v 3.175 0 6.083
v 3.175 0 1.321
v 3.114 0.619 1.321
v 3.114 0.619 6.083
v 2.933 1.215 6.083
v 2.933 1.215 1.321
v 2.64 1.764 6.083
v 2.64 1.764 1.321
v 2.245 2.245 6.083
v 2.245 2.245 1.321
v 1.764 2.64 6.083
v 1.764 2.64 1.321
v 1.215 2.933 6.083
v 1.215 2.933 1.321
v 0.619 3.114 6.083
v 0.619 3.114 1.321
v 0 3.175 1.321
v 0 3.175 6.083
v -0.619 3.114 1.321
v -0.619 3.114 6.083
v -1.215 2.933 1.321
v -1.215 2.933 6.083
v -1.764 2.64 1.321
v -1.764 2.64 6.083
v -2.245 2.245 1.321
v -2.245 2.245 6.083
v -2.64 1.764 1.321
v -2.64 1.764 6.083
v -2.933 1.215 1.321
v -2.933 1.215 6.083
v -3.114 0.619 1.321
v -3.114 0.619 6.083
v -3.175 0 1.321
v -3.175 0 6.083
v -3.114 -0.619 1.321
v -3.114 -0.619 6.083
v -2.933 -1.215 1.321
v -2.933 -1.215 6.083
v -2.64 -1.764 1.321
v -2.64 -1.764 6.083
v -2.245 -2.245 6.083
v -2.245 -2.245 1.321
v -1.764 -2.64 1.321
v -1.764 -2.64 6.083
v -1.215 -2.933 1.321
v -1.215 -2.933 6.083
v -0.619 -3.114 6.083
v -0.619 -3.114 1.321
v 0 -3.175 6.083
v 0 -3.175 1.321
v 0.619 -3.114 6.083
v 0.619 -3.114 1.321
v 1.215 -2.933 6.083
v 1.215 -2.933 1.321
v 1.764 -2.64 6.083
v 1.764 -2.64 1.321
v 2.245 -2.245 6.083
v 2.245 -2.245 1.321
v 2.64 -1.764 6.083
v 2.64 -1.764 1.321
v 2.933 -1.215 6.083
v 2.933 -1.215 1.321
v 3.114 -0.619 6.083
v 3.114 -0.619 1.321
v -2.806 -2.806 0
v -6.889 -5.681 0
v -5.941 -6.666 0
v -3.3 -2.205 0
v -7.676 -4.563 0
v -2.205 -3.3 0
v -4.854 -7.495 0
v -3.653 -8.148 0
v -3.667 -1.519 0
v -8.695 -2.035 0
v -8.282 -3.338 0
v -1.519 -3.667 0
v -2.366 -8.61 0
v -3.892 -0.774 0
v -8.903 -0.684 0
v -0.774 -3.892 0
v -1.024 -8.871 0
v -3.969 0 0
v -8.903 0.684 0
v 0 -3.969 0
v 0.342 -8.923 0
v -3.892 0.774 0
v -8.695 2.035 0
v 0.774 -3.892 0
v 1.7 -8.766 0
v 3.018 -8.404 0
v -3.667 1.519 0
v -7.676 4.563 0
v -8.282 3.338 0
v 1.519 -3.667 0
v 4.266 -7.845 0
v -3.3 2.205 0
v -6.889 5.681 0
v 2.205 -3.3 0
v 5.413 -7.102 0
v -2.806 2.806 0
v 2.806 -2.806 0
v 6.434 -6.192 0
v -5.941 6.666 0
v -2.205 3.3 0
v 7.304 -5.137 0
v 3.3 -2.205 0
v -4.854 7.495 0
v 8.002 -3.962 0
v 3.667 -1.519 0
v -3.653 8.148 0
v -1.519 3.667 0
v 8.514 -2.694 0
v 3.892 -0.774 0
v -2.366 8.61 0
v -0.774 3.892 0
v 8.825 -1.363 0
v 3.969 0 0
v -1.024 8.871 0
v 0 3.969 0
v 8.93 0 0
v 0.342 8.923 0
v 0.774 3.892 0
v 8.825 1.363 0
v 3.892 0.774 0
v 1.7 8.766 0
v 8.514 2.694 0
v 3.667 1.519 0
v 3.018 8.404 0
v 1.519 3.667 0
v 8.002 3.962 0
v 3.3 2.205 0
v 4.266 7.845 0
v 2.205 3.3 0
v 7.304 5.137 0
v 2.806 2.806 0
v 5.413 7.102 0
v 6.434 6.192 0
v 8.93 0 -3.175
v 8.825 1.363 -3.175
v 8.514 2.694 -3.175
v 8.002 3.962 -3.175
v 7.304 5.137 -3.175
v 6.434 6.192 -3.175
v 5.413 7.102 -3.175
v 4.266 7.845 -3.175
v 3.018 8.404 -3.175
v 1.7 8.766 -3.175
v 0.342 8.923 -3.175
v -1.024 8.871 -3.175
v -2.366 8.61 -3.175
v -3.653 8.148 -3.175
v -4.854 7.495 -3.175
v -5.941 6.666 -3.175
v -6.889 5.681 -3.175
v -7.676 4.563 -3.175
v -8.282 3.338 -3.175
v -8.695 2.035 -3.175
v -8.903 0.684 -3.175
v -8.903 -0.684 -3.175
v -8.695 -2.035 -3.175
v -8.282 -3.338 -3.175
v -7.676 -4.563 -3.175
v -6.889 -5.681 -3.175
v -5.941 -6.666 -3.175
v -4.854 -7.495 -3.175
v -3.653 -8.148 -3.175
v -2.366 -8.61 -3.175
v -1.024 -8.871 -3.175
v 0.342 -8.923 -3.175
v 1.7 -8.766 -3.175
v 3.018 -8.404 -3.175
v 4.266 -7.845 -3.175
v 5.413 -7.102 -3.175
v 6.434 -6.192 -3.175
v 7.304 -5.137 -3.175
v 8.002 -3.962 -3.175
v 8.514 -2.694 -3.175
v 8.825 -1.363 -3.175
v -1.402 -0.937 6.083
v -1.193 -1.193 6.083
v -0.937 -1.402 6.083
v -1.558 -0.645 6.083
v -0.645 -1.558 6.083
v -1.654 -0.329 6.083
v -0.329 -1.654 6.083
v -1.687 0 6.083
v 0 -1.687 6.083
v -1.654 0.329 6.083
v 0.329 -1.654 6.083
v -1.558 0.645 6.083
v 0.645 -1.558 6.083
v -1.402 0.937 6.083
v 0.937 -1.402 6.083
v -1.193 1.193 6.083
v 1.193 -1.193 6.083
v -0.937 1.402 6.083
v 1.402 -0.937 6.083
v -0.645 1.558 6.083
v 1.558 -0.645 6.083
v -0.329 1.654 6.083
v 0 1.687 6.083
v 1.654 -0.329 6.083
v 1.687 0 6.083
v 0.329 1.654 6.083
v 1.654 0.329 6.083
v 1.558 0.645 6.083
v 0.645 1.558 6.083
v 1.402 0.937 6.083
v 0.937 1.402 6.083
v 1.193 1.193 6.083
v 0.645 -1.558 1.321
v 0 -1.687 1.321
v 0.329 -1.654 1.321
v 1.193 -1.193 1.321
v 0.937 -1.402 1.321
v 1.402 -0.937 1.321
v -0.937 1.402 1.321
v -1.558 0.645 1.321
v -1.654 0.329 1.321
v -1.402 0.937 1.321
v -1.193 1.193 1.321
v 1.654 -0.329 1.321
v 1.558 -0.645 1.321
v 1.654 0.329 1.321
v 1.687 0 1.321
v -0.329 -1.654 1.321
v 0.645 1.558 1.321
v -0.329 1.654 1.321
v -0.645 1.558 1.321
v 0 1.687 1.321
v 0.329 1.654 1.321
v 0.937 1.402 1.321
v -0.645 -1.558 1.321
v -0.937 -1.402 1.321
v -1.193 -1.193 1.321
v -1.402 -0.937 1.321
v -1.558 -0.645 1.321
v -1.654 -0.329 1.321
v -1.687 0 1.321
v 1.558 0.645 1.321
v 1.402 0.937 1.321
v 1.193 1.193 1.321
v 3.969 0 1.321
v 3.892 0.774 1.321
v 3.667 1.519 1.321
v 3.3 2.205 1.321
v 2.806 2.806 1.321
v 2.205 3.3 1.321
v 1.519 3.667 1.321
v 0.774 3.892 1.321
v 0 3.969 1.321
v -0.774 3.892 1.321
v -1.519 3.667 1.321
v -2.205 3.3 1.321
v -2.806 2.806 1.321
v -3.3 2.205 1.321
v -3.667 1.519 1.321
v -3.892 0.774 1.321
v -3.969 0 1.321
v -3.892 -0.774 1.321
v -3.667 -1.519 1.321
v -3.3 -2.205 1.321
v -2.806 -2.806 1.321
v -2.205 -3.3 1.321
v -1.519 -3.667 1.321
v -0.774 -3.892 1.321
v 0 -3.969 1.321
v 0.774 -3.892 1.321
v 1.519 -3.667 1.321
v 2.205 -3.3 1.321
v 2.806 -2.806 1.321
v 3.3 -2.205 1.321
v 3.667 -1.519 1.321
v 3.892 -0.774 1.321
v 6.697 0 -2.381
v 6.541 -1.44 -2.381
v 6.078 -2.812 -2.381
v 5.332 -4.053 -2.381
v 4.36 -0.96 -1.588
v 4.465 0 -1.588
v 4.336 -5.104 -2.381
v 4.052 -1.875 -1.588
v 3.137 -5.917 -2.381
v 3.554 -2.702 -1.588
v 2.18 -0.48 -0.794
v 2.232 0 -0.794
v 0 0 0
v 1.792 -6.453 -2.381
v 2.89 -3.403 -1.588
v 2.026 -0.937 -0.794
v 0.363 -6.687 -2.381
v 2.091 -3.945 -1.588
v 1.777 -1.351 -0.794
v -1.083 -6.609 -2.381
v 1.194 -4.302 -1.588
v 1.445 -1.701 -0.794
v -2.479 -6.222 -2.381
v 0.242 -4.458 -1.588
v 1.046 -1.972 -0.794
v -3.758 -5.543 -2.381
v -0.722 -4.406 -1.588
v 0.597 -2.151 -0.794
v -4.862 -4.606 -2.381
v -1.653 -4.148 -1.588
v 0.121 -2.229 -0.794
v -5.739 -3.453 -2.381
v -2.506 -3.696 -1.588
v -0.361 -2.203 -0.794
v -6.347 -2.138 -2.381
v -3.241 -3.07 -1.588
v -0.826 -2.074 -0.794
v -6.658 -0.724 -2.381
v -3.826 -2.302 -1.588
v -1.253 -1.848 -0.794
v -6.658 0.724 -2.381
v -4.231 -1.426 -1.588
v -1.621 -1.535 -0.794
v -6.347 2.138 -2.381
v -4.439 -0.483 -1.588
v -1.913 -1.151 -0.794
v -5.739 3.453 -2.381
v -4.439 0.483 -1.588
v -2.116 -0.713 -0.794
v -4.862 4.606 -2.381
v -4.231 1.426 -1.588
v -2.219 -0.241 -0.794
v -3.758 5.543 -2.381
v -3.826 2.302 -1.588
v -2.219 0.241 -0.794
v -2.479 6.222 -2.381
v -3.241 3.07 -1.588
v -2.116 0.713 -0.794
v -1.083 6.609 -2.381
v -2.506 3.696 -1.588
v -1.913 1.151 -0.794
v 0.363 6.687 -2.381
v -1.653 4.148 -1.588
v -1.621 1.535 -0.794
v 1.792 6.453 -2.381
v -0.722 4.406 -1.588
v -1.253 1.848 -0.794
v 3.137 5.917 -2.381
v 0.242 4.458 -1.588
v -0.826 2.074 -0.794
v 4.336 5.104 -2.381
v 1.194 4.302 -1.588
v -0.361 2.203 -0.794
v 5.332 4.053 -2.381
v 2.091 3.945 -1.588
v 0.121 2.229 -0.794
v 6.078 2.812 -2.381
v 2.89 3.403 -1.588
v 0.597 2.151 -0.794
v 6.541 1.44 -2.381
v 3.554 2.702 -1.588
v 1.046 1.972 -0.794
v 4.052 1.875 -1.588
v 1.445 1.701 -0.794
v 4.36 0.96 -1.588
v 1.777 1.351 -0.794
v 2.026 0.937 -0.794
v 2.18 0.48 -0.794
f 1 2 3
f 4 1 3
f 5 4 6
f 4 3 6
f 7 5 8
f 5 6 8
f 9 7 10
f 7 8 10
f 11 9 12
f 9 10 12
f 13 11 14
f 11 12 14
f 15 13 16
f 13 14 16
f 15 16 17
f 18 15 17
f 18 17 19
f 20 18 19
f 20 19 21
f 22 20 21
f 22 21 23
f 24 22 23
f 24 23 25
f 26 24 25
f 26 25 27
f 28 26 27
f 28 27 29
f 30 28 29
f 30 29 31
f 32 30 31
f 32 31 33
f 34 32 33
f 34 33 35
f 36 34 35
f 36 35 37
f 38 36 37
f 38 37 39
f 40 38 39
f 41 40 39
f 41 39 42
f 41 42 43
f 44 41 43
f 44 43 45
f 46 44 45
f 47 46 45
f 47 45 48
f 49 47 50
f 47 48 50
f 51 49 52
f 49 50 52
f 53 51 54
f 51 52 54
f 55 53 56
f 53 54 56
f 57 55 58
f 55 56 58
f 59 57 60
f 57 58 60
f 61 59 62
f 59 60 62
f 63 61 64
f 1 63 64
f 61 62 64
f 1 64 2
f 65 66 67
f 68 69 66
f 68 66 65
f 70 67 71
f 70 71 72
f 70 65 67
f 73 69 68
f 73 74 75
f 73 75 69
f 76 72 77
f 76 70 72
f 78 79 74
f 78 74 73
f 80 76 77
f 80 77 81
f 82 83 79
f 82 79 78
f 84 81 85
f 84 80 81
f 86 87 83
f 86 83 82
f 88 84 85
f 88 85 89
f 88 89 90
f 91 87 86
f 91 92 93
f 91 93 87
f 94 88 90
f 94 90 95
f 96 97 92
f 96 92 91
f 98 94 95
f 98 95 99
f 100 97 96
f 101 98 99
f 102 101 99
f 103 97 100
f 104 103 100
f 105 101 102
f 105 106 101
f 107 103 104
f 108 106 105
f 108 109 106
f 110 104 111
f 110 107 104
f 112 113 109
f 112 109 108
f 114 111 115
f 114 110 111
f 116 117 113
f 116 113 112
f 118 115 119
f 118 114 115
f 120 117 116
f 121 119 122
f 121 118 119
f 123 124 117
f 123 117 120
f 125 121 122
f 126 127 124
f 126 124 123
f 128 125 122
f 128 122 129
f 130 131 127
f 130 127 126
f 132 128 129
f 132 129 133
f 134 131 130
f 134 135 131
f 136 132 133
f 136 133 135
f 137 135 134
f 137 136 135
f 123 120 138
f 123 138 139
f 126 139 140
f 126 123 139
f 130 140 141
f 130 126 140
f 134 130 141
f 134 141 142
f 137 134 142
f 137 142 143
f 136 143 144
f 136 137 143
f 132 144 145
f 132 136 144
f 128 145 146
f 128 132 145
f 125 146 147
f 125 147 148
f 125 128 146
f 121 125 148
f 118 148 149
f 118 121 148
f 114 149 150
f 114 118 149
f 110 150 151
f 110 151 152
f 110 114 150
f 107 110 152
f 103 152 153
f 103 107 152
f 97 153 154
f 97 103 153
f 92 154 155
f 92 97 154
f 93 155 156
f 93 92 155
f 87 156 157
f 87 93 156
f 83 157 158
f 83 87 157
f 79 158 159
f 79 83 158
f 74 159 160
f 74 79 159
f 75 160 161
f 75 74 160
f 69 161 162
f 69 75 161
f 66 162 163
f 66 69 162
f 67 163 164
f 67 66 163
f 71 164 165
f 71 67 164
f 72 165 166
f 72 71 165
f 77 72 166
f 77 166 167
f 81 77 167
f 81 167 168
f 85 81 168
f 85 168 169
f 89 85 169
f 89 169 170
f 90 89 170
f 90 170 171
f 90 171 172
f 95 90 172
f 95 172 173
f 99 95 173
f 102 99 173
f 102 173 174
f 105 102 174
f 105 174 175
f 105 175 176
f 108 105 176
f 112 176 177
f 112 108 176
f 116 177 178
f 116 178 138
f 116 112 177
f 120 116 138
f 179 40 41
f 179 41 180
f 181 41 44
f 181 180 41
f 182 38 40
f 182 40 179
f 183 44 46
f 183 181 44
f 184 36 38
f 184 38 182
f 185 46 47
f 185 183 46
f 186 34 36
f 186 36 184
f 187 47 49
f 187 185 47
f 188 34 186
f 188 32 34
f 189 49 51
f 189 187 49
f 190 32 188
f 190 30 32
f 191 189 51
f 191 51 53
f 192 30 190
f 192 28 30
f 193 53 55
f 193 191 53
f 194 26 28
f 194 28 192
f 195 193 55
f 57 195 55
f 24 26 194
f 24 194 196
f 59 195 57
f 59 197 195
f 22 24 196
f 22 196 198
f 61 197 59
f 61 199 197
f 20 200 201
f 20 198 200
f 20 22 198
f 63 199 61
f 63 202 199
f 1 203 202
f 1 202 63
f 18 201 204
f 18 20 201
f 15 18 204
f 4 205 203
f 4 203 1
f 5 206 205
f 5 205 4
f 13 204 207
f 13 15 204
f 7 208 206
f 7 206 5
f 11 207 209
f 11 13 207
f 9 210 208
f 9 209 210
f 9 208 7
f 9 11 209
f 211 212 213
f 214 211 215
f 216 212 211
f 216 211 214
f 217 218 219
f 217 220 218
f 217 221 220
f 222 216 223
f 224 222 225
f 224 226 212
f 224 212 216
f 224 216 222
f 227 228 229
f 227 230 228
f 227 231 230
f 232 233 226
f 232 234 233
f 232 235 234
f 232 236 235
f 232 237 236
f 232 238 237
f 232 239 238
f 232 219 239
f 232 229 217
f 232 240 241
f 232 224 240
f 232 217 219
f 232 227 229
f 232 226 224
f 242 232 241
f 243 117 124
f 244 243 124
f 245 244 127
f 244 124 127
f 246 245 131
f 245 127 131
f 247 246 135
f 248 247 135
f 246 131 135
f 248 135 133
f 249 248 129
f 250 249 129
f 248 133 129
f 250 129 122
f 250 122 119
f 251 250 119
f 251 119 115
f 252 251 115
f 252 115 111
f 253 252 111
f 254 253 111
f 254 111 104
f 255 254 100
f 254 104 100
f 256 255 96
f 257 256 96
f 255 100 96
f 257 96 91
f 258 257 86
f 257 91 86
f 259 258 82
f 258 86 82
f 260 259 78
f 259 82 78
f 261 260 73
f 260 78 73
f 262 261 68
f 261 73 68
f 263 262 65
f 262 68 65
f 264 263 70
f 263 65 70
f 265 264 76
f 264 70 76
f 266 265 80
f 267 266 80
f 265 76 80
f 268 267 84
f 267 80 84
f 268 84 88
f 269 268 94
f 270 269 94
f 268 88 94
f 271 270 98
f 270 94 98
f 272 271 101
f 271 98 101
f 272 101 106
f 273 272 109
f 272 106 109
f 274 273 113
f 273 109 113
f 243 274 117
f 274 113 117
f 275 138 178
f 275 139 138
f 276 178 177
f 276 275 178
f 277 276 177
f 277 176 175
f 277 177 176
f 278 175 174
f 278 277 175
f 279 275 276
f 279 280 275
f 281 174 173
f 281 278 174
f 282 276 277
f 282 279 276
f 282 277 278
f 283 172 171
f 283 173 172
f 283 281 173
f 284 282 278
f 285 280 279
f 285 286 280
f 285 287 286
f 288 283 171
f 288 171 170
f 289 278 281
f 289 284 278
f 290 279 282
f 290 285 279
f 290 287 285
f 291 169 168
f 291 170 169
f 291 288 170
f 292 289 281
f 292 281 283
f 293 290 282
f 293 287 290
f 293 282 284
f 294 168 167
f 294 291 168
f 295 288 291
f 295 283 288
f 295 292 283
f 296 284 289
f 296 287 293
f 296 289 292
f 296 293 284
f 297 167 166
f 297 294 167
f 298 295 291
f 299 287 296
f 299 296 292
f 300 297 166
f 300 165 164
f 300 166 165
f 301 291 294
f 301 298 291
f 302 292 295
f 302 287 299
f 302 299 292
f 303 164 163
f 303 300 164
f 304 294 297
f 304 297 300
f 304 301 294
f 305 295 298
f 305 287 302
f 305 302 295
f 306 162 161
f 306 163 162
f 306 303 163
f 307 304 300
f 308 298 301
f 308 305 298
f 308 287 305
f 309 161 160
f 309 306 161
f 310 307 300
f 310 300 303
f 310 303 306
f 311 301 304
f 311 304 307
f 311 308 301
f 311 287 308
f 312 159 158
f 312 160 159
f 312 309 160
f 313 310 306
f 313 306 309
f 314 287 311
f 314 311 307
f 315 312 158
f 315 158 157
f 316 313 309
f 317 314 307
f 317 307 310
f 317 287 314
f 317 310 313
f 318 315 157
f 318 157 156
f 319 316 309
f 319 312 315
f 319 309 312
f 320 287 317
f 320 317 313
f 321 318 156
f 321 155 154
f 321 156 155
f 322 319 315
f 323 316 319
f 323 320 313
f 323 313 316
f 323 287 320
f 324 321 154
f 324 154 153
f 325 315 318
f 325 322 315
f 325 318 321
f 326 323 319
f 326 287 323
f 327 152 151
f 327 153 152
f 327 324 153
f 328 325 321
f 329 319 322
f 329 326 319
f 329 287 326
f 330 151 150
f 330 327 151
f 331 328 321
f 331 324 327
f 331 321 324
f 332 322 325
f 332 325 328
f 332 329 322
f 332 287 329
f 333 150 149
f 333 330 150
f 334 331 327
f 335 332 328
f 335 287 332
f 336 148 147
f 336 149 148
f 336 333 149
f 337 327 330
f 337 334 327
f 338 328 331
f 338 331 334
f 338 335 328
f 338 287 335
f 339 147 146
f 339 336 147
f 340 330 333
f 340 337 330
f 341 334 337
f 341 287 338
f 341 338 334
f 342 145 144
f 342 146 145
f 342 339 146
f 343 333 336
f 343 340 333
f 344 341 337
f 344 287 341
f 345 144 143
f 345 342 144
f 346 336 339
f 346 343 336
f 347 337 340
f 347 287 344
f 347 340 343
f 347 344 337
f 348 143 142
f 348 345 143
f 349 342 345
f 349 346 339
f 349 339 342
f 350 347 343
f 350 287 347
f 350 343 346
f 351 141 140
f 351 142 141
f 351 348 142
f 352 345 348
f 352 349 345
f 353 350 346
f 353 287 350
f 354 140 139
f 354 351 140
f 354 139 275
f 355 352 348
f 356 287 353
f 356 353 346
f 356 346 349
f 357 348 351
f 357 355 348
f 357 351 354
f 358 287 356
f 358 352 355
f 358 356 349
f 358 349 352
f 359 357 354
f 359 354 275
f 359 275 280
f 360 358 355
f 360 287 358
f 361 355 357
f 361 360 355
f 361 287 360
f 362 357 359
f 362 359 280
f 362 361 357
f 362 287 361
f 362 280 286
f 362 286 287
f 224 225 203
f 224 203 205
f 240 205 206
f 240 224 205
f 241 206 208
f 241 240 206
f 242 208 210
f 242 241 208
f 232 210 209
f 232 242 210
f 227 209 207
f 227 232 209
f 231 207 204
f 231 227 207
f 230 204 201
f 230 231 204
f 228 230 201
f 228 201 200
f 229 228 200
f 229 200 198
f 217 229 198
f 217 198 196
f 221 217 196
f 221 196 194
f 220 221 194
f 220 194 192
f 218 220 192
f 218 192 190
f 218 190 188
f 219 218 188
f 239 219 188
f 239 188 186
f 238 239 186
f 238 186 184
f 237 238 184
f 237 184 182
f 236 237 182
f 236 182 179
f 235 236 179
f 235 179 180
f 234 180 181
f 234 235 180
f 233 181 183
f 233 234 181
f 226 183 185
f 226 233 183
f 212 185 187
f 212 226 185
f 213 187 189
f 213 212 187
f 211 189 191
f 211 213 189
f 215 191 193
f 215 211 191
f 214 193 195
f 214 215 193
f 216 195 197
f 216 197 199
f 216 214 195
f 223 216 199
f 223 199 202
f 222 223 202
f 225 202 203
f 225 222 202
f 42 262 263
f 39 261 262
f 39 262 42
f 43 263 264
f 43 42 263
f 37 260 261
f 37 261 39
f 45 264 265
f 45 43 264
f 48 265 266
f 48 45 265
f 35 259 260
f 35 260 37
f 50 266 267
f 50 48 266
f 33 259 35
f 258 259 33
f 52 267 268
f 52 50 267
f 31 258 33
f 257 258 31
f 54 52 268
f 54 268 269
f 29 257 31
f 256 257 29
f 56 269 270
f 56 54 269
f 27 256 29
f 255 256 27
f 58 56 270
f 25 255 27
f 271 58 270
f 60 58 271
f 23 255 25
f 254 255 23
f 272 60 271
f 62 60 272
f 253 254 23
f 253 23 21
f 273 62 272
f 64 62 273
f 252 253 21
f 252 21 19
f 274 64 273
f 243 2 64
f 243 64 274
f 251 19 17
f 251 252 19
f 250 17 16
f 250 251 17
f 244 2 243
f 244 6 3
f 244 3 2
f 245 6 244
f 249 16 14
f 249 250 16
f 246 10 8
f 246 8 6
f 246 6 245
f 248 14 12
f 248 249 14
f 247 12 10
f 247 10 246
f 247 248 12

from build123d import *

# Parameters (mm, degrees)
F0_R      = 8.9296875
F0_R_2    = 3.96875
F0_R_3    = 3.175
F0_R_4    = 1.68671875
F1_DEPTH  = 3.175
F2_DEPTH  = 1.3208
F3_DEPTH  = 6.0833
F1_FACE_R = 8.9296875


# Not quite as in the source:
# - a length typed as a fraction of an inch, garbled in the dataset ("3 / 203.2 mm" for 3/8 in), is restored


with BuildPart() as f1:
    # F0 (on Top) → F1 (new body)
    with BuildSketch(Plane.XY):
        Circle(F0_R)
        Circle(F0_R_2, mode=Mode.SUBTRACT)
        Circle(F0_R_2)
        Circle(F0_R_3, mode=Mode.SUBTRACT)
        Circle(F0_R_3)
        Circle(F0_R_4, mode=Mode.SUBTRACT)
        Circle(F0_R_4)
    extrude(amount=-F1_DEPTH)

    # F0 (on Top) → F2 (join)
    with BuildSketch(Plane.XY):
        Circle(F0_R_2)
        Circle(F0_R_3, mode=Mode.SUBTRACT)
        Circle(F0_R_3)
        Circle(F0_R_4, mode=Mode.SUBTRACT)
        Circle(F0_R_4)
    extrude(amount=F2_DEPTH)

    # F0 (on Top) → F3 (join)
    with BuildSketch(Plane.XY):
        Circle(F0_R_3)
        Circle(F0_R_4, mode=Mode.SUBTRACT)
    extrude(amount=F3_DEPTH)

    # F1_face (on face) → F4 section 0
    with BuildSketch(Plane(origin=(0, 0, -3.175), x_dir=(1, 0, 0), z_dir=(0, 0, -1)), mode=Mode.PRIVATE) as f4_s0:
        Circle(F1_FACE_R)
    loft([f4_s0.sketch, Vertex(0, 0, 0)], mode=Mode.SUBTRACT)


solid = f1.part
